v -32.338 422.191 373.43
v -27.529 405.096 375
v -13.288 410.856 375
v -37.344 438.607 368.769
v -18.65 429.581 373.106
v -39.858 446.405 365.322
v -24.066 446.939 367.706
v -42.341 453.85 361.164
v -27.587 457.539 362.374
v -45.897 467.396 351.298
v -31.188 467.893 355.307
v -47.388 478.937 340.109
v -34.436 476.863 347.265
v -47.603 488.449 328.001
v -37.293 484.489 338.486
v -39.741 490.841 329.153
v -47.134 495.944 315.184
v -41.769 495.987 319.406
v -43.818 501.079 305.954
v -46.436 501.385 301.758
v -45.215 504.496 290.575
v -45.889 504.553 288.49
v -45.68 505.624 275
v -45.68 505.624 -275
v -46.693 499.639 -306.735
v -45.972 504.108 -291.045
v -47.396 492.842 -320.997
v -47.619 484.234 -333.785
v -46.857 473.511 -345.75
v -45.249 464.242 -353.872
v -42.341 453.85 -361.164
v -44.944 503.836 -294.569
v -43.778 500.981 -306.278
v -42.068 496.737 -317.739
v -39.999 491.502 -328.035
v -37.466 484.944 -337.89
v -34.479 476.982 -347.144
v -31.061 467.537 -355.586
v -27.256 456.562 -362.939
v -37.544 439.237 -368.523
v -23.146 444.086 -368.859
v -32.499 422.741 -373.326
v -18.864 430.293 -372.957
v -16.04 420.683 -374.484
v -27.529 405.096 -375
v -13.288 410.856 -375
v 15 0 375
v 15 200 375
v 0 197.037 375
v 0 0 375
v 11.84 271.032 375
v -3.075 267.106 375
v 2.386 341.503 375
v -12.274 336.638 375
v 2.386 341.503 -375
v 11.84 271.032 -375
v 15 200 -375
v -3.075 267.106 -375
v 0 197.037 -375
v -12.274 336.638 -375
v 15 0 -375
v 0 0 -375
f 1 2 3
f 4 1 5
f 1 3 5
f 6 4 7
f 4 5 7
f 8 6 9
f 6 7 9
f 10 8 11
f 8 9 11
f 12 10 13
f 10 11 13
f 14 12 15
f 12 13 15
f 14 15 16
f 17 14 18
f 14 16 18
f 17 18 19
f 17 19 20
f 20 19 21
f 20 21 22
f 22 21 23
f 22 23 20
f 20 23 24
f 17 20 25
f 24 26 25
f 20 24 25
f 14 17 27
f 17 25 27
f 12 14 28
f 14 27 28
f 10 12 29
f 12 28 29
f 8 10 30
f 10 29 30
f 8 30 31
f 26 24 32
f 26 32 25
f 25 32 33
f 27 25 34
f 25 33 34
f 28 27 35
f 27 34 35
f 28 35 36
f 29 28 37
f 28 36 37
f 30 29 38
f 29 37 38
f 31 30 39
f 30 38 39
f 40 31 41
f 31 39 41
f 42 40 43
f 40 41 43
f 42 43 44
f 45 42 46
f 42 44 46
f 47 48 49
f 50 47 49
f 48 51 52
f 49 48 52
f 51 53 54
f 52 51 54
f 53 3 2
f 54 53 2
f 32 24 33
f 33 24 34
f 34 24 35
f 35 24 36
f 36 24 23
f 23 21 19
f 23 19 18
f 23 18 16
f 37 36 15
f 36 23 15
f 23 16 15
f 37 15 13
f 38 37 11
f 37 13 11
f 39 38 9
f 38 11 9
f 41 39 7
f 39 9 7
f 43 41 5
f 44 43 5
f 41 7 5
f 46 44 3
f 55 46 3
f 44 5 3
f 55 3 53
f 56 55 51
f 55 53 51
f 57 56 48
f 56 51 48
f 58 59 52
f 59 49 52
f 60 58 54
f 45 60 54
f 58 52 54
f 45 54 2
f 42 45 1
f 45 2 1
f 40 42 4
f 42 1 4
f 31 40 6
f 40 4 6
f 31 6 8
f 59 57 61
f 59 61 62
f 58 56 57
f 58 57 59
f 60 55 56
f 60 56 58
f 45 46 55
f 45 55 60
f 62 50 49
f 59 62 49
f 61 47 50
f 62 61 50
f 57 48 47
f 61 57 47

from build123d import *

# Parameters (mm, degrees)
BOSS_EXTRUDE1_DEPTH = 375
FILLET1_R           = 100
FILLET2_R           = 100


with BuildPart() as part:
    # Sketch2 → Boss-Extrude1 (new, symmetric)
    with BuildSketch(Plane.XY):
        with BuildLine():
            Line((0, 0), (0, 197.03652177061554))
            ThreePointArc((0, 197.03652177061554), (-15.037794104979639, 351.42024926941554), (-59.58583829105939, 499.99999999999994))
            Line((-59.58583829105939, 499.99999999999994), (-45.68004275536319, 505.62395328211494))
            ThreePointArc((-45.68004275536319, 505.62395328211494), (-0.31663526116813046, 355.79479163998155), (15, 200))
            Line((15, 200), (15, 0))
            Line((15, 0), (0, 0))
        make_face()
    extrude(amount=BOSS_EXTRUDE1_DEPTH, both=True)

    # Fillet1
    fillet1_edges = [part.edges().sort_by_distance(p)[0] for p in [
        (-52.63294052321129, 502.8119766410574, 375),
        (-52.63294052321129, 502.8119766410574, -375),
    ]]
    fillet(fillet1_edges, radius=FILLET1_R)

    # Fillet2
    # the kernel refuses this fillet: 100 mm, written as the material it takes off along each edge
    with BuildSketch(Plane(origin=(-59.585838291059304, 500, -398.16540938759147), x_dir=(0.35002683735088513, -0.9367396720189324, 0), z_dir=(0, 0, 1))) as fillet2_piece_1:
        with BuildLine():
            CenterArc((52.34529898972619, 99.95258338935764), FILLET2_R, 238.16595036799683, 30.069556200548902)
            Line((-0.40077852073035836, 14.99464493001819), (-1.4557000709394878, 13.295486160831398))
            ThreePointArc((-1.4557000709394878, 13.295486160831398), (-2.1996752510342628, 7.443885328911702), (-1.9992859906690836, -0.05343713609739175))
            Line((-1.9992859906690836, -0.05343713609739175), (0.06158270469381519, -1.9990516677871575))
            ThreePointArc((0.06158270469381519, -1.9990516677871575), (24.633081877518478, -1.6206671148610328), (49.20458105034301, -1.999051667787162))
            Line((49.20458105034301, -1.999051667787162), (49.266163755036786, -3.27e-15))
        make_face()
    extrude(amount=796.3308187751829, mode=Mode.SUBTRACT)


solid = part.part
